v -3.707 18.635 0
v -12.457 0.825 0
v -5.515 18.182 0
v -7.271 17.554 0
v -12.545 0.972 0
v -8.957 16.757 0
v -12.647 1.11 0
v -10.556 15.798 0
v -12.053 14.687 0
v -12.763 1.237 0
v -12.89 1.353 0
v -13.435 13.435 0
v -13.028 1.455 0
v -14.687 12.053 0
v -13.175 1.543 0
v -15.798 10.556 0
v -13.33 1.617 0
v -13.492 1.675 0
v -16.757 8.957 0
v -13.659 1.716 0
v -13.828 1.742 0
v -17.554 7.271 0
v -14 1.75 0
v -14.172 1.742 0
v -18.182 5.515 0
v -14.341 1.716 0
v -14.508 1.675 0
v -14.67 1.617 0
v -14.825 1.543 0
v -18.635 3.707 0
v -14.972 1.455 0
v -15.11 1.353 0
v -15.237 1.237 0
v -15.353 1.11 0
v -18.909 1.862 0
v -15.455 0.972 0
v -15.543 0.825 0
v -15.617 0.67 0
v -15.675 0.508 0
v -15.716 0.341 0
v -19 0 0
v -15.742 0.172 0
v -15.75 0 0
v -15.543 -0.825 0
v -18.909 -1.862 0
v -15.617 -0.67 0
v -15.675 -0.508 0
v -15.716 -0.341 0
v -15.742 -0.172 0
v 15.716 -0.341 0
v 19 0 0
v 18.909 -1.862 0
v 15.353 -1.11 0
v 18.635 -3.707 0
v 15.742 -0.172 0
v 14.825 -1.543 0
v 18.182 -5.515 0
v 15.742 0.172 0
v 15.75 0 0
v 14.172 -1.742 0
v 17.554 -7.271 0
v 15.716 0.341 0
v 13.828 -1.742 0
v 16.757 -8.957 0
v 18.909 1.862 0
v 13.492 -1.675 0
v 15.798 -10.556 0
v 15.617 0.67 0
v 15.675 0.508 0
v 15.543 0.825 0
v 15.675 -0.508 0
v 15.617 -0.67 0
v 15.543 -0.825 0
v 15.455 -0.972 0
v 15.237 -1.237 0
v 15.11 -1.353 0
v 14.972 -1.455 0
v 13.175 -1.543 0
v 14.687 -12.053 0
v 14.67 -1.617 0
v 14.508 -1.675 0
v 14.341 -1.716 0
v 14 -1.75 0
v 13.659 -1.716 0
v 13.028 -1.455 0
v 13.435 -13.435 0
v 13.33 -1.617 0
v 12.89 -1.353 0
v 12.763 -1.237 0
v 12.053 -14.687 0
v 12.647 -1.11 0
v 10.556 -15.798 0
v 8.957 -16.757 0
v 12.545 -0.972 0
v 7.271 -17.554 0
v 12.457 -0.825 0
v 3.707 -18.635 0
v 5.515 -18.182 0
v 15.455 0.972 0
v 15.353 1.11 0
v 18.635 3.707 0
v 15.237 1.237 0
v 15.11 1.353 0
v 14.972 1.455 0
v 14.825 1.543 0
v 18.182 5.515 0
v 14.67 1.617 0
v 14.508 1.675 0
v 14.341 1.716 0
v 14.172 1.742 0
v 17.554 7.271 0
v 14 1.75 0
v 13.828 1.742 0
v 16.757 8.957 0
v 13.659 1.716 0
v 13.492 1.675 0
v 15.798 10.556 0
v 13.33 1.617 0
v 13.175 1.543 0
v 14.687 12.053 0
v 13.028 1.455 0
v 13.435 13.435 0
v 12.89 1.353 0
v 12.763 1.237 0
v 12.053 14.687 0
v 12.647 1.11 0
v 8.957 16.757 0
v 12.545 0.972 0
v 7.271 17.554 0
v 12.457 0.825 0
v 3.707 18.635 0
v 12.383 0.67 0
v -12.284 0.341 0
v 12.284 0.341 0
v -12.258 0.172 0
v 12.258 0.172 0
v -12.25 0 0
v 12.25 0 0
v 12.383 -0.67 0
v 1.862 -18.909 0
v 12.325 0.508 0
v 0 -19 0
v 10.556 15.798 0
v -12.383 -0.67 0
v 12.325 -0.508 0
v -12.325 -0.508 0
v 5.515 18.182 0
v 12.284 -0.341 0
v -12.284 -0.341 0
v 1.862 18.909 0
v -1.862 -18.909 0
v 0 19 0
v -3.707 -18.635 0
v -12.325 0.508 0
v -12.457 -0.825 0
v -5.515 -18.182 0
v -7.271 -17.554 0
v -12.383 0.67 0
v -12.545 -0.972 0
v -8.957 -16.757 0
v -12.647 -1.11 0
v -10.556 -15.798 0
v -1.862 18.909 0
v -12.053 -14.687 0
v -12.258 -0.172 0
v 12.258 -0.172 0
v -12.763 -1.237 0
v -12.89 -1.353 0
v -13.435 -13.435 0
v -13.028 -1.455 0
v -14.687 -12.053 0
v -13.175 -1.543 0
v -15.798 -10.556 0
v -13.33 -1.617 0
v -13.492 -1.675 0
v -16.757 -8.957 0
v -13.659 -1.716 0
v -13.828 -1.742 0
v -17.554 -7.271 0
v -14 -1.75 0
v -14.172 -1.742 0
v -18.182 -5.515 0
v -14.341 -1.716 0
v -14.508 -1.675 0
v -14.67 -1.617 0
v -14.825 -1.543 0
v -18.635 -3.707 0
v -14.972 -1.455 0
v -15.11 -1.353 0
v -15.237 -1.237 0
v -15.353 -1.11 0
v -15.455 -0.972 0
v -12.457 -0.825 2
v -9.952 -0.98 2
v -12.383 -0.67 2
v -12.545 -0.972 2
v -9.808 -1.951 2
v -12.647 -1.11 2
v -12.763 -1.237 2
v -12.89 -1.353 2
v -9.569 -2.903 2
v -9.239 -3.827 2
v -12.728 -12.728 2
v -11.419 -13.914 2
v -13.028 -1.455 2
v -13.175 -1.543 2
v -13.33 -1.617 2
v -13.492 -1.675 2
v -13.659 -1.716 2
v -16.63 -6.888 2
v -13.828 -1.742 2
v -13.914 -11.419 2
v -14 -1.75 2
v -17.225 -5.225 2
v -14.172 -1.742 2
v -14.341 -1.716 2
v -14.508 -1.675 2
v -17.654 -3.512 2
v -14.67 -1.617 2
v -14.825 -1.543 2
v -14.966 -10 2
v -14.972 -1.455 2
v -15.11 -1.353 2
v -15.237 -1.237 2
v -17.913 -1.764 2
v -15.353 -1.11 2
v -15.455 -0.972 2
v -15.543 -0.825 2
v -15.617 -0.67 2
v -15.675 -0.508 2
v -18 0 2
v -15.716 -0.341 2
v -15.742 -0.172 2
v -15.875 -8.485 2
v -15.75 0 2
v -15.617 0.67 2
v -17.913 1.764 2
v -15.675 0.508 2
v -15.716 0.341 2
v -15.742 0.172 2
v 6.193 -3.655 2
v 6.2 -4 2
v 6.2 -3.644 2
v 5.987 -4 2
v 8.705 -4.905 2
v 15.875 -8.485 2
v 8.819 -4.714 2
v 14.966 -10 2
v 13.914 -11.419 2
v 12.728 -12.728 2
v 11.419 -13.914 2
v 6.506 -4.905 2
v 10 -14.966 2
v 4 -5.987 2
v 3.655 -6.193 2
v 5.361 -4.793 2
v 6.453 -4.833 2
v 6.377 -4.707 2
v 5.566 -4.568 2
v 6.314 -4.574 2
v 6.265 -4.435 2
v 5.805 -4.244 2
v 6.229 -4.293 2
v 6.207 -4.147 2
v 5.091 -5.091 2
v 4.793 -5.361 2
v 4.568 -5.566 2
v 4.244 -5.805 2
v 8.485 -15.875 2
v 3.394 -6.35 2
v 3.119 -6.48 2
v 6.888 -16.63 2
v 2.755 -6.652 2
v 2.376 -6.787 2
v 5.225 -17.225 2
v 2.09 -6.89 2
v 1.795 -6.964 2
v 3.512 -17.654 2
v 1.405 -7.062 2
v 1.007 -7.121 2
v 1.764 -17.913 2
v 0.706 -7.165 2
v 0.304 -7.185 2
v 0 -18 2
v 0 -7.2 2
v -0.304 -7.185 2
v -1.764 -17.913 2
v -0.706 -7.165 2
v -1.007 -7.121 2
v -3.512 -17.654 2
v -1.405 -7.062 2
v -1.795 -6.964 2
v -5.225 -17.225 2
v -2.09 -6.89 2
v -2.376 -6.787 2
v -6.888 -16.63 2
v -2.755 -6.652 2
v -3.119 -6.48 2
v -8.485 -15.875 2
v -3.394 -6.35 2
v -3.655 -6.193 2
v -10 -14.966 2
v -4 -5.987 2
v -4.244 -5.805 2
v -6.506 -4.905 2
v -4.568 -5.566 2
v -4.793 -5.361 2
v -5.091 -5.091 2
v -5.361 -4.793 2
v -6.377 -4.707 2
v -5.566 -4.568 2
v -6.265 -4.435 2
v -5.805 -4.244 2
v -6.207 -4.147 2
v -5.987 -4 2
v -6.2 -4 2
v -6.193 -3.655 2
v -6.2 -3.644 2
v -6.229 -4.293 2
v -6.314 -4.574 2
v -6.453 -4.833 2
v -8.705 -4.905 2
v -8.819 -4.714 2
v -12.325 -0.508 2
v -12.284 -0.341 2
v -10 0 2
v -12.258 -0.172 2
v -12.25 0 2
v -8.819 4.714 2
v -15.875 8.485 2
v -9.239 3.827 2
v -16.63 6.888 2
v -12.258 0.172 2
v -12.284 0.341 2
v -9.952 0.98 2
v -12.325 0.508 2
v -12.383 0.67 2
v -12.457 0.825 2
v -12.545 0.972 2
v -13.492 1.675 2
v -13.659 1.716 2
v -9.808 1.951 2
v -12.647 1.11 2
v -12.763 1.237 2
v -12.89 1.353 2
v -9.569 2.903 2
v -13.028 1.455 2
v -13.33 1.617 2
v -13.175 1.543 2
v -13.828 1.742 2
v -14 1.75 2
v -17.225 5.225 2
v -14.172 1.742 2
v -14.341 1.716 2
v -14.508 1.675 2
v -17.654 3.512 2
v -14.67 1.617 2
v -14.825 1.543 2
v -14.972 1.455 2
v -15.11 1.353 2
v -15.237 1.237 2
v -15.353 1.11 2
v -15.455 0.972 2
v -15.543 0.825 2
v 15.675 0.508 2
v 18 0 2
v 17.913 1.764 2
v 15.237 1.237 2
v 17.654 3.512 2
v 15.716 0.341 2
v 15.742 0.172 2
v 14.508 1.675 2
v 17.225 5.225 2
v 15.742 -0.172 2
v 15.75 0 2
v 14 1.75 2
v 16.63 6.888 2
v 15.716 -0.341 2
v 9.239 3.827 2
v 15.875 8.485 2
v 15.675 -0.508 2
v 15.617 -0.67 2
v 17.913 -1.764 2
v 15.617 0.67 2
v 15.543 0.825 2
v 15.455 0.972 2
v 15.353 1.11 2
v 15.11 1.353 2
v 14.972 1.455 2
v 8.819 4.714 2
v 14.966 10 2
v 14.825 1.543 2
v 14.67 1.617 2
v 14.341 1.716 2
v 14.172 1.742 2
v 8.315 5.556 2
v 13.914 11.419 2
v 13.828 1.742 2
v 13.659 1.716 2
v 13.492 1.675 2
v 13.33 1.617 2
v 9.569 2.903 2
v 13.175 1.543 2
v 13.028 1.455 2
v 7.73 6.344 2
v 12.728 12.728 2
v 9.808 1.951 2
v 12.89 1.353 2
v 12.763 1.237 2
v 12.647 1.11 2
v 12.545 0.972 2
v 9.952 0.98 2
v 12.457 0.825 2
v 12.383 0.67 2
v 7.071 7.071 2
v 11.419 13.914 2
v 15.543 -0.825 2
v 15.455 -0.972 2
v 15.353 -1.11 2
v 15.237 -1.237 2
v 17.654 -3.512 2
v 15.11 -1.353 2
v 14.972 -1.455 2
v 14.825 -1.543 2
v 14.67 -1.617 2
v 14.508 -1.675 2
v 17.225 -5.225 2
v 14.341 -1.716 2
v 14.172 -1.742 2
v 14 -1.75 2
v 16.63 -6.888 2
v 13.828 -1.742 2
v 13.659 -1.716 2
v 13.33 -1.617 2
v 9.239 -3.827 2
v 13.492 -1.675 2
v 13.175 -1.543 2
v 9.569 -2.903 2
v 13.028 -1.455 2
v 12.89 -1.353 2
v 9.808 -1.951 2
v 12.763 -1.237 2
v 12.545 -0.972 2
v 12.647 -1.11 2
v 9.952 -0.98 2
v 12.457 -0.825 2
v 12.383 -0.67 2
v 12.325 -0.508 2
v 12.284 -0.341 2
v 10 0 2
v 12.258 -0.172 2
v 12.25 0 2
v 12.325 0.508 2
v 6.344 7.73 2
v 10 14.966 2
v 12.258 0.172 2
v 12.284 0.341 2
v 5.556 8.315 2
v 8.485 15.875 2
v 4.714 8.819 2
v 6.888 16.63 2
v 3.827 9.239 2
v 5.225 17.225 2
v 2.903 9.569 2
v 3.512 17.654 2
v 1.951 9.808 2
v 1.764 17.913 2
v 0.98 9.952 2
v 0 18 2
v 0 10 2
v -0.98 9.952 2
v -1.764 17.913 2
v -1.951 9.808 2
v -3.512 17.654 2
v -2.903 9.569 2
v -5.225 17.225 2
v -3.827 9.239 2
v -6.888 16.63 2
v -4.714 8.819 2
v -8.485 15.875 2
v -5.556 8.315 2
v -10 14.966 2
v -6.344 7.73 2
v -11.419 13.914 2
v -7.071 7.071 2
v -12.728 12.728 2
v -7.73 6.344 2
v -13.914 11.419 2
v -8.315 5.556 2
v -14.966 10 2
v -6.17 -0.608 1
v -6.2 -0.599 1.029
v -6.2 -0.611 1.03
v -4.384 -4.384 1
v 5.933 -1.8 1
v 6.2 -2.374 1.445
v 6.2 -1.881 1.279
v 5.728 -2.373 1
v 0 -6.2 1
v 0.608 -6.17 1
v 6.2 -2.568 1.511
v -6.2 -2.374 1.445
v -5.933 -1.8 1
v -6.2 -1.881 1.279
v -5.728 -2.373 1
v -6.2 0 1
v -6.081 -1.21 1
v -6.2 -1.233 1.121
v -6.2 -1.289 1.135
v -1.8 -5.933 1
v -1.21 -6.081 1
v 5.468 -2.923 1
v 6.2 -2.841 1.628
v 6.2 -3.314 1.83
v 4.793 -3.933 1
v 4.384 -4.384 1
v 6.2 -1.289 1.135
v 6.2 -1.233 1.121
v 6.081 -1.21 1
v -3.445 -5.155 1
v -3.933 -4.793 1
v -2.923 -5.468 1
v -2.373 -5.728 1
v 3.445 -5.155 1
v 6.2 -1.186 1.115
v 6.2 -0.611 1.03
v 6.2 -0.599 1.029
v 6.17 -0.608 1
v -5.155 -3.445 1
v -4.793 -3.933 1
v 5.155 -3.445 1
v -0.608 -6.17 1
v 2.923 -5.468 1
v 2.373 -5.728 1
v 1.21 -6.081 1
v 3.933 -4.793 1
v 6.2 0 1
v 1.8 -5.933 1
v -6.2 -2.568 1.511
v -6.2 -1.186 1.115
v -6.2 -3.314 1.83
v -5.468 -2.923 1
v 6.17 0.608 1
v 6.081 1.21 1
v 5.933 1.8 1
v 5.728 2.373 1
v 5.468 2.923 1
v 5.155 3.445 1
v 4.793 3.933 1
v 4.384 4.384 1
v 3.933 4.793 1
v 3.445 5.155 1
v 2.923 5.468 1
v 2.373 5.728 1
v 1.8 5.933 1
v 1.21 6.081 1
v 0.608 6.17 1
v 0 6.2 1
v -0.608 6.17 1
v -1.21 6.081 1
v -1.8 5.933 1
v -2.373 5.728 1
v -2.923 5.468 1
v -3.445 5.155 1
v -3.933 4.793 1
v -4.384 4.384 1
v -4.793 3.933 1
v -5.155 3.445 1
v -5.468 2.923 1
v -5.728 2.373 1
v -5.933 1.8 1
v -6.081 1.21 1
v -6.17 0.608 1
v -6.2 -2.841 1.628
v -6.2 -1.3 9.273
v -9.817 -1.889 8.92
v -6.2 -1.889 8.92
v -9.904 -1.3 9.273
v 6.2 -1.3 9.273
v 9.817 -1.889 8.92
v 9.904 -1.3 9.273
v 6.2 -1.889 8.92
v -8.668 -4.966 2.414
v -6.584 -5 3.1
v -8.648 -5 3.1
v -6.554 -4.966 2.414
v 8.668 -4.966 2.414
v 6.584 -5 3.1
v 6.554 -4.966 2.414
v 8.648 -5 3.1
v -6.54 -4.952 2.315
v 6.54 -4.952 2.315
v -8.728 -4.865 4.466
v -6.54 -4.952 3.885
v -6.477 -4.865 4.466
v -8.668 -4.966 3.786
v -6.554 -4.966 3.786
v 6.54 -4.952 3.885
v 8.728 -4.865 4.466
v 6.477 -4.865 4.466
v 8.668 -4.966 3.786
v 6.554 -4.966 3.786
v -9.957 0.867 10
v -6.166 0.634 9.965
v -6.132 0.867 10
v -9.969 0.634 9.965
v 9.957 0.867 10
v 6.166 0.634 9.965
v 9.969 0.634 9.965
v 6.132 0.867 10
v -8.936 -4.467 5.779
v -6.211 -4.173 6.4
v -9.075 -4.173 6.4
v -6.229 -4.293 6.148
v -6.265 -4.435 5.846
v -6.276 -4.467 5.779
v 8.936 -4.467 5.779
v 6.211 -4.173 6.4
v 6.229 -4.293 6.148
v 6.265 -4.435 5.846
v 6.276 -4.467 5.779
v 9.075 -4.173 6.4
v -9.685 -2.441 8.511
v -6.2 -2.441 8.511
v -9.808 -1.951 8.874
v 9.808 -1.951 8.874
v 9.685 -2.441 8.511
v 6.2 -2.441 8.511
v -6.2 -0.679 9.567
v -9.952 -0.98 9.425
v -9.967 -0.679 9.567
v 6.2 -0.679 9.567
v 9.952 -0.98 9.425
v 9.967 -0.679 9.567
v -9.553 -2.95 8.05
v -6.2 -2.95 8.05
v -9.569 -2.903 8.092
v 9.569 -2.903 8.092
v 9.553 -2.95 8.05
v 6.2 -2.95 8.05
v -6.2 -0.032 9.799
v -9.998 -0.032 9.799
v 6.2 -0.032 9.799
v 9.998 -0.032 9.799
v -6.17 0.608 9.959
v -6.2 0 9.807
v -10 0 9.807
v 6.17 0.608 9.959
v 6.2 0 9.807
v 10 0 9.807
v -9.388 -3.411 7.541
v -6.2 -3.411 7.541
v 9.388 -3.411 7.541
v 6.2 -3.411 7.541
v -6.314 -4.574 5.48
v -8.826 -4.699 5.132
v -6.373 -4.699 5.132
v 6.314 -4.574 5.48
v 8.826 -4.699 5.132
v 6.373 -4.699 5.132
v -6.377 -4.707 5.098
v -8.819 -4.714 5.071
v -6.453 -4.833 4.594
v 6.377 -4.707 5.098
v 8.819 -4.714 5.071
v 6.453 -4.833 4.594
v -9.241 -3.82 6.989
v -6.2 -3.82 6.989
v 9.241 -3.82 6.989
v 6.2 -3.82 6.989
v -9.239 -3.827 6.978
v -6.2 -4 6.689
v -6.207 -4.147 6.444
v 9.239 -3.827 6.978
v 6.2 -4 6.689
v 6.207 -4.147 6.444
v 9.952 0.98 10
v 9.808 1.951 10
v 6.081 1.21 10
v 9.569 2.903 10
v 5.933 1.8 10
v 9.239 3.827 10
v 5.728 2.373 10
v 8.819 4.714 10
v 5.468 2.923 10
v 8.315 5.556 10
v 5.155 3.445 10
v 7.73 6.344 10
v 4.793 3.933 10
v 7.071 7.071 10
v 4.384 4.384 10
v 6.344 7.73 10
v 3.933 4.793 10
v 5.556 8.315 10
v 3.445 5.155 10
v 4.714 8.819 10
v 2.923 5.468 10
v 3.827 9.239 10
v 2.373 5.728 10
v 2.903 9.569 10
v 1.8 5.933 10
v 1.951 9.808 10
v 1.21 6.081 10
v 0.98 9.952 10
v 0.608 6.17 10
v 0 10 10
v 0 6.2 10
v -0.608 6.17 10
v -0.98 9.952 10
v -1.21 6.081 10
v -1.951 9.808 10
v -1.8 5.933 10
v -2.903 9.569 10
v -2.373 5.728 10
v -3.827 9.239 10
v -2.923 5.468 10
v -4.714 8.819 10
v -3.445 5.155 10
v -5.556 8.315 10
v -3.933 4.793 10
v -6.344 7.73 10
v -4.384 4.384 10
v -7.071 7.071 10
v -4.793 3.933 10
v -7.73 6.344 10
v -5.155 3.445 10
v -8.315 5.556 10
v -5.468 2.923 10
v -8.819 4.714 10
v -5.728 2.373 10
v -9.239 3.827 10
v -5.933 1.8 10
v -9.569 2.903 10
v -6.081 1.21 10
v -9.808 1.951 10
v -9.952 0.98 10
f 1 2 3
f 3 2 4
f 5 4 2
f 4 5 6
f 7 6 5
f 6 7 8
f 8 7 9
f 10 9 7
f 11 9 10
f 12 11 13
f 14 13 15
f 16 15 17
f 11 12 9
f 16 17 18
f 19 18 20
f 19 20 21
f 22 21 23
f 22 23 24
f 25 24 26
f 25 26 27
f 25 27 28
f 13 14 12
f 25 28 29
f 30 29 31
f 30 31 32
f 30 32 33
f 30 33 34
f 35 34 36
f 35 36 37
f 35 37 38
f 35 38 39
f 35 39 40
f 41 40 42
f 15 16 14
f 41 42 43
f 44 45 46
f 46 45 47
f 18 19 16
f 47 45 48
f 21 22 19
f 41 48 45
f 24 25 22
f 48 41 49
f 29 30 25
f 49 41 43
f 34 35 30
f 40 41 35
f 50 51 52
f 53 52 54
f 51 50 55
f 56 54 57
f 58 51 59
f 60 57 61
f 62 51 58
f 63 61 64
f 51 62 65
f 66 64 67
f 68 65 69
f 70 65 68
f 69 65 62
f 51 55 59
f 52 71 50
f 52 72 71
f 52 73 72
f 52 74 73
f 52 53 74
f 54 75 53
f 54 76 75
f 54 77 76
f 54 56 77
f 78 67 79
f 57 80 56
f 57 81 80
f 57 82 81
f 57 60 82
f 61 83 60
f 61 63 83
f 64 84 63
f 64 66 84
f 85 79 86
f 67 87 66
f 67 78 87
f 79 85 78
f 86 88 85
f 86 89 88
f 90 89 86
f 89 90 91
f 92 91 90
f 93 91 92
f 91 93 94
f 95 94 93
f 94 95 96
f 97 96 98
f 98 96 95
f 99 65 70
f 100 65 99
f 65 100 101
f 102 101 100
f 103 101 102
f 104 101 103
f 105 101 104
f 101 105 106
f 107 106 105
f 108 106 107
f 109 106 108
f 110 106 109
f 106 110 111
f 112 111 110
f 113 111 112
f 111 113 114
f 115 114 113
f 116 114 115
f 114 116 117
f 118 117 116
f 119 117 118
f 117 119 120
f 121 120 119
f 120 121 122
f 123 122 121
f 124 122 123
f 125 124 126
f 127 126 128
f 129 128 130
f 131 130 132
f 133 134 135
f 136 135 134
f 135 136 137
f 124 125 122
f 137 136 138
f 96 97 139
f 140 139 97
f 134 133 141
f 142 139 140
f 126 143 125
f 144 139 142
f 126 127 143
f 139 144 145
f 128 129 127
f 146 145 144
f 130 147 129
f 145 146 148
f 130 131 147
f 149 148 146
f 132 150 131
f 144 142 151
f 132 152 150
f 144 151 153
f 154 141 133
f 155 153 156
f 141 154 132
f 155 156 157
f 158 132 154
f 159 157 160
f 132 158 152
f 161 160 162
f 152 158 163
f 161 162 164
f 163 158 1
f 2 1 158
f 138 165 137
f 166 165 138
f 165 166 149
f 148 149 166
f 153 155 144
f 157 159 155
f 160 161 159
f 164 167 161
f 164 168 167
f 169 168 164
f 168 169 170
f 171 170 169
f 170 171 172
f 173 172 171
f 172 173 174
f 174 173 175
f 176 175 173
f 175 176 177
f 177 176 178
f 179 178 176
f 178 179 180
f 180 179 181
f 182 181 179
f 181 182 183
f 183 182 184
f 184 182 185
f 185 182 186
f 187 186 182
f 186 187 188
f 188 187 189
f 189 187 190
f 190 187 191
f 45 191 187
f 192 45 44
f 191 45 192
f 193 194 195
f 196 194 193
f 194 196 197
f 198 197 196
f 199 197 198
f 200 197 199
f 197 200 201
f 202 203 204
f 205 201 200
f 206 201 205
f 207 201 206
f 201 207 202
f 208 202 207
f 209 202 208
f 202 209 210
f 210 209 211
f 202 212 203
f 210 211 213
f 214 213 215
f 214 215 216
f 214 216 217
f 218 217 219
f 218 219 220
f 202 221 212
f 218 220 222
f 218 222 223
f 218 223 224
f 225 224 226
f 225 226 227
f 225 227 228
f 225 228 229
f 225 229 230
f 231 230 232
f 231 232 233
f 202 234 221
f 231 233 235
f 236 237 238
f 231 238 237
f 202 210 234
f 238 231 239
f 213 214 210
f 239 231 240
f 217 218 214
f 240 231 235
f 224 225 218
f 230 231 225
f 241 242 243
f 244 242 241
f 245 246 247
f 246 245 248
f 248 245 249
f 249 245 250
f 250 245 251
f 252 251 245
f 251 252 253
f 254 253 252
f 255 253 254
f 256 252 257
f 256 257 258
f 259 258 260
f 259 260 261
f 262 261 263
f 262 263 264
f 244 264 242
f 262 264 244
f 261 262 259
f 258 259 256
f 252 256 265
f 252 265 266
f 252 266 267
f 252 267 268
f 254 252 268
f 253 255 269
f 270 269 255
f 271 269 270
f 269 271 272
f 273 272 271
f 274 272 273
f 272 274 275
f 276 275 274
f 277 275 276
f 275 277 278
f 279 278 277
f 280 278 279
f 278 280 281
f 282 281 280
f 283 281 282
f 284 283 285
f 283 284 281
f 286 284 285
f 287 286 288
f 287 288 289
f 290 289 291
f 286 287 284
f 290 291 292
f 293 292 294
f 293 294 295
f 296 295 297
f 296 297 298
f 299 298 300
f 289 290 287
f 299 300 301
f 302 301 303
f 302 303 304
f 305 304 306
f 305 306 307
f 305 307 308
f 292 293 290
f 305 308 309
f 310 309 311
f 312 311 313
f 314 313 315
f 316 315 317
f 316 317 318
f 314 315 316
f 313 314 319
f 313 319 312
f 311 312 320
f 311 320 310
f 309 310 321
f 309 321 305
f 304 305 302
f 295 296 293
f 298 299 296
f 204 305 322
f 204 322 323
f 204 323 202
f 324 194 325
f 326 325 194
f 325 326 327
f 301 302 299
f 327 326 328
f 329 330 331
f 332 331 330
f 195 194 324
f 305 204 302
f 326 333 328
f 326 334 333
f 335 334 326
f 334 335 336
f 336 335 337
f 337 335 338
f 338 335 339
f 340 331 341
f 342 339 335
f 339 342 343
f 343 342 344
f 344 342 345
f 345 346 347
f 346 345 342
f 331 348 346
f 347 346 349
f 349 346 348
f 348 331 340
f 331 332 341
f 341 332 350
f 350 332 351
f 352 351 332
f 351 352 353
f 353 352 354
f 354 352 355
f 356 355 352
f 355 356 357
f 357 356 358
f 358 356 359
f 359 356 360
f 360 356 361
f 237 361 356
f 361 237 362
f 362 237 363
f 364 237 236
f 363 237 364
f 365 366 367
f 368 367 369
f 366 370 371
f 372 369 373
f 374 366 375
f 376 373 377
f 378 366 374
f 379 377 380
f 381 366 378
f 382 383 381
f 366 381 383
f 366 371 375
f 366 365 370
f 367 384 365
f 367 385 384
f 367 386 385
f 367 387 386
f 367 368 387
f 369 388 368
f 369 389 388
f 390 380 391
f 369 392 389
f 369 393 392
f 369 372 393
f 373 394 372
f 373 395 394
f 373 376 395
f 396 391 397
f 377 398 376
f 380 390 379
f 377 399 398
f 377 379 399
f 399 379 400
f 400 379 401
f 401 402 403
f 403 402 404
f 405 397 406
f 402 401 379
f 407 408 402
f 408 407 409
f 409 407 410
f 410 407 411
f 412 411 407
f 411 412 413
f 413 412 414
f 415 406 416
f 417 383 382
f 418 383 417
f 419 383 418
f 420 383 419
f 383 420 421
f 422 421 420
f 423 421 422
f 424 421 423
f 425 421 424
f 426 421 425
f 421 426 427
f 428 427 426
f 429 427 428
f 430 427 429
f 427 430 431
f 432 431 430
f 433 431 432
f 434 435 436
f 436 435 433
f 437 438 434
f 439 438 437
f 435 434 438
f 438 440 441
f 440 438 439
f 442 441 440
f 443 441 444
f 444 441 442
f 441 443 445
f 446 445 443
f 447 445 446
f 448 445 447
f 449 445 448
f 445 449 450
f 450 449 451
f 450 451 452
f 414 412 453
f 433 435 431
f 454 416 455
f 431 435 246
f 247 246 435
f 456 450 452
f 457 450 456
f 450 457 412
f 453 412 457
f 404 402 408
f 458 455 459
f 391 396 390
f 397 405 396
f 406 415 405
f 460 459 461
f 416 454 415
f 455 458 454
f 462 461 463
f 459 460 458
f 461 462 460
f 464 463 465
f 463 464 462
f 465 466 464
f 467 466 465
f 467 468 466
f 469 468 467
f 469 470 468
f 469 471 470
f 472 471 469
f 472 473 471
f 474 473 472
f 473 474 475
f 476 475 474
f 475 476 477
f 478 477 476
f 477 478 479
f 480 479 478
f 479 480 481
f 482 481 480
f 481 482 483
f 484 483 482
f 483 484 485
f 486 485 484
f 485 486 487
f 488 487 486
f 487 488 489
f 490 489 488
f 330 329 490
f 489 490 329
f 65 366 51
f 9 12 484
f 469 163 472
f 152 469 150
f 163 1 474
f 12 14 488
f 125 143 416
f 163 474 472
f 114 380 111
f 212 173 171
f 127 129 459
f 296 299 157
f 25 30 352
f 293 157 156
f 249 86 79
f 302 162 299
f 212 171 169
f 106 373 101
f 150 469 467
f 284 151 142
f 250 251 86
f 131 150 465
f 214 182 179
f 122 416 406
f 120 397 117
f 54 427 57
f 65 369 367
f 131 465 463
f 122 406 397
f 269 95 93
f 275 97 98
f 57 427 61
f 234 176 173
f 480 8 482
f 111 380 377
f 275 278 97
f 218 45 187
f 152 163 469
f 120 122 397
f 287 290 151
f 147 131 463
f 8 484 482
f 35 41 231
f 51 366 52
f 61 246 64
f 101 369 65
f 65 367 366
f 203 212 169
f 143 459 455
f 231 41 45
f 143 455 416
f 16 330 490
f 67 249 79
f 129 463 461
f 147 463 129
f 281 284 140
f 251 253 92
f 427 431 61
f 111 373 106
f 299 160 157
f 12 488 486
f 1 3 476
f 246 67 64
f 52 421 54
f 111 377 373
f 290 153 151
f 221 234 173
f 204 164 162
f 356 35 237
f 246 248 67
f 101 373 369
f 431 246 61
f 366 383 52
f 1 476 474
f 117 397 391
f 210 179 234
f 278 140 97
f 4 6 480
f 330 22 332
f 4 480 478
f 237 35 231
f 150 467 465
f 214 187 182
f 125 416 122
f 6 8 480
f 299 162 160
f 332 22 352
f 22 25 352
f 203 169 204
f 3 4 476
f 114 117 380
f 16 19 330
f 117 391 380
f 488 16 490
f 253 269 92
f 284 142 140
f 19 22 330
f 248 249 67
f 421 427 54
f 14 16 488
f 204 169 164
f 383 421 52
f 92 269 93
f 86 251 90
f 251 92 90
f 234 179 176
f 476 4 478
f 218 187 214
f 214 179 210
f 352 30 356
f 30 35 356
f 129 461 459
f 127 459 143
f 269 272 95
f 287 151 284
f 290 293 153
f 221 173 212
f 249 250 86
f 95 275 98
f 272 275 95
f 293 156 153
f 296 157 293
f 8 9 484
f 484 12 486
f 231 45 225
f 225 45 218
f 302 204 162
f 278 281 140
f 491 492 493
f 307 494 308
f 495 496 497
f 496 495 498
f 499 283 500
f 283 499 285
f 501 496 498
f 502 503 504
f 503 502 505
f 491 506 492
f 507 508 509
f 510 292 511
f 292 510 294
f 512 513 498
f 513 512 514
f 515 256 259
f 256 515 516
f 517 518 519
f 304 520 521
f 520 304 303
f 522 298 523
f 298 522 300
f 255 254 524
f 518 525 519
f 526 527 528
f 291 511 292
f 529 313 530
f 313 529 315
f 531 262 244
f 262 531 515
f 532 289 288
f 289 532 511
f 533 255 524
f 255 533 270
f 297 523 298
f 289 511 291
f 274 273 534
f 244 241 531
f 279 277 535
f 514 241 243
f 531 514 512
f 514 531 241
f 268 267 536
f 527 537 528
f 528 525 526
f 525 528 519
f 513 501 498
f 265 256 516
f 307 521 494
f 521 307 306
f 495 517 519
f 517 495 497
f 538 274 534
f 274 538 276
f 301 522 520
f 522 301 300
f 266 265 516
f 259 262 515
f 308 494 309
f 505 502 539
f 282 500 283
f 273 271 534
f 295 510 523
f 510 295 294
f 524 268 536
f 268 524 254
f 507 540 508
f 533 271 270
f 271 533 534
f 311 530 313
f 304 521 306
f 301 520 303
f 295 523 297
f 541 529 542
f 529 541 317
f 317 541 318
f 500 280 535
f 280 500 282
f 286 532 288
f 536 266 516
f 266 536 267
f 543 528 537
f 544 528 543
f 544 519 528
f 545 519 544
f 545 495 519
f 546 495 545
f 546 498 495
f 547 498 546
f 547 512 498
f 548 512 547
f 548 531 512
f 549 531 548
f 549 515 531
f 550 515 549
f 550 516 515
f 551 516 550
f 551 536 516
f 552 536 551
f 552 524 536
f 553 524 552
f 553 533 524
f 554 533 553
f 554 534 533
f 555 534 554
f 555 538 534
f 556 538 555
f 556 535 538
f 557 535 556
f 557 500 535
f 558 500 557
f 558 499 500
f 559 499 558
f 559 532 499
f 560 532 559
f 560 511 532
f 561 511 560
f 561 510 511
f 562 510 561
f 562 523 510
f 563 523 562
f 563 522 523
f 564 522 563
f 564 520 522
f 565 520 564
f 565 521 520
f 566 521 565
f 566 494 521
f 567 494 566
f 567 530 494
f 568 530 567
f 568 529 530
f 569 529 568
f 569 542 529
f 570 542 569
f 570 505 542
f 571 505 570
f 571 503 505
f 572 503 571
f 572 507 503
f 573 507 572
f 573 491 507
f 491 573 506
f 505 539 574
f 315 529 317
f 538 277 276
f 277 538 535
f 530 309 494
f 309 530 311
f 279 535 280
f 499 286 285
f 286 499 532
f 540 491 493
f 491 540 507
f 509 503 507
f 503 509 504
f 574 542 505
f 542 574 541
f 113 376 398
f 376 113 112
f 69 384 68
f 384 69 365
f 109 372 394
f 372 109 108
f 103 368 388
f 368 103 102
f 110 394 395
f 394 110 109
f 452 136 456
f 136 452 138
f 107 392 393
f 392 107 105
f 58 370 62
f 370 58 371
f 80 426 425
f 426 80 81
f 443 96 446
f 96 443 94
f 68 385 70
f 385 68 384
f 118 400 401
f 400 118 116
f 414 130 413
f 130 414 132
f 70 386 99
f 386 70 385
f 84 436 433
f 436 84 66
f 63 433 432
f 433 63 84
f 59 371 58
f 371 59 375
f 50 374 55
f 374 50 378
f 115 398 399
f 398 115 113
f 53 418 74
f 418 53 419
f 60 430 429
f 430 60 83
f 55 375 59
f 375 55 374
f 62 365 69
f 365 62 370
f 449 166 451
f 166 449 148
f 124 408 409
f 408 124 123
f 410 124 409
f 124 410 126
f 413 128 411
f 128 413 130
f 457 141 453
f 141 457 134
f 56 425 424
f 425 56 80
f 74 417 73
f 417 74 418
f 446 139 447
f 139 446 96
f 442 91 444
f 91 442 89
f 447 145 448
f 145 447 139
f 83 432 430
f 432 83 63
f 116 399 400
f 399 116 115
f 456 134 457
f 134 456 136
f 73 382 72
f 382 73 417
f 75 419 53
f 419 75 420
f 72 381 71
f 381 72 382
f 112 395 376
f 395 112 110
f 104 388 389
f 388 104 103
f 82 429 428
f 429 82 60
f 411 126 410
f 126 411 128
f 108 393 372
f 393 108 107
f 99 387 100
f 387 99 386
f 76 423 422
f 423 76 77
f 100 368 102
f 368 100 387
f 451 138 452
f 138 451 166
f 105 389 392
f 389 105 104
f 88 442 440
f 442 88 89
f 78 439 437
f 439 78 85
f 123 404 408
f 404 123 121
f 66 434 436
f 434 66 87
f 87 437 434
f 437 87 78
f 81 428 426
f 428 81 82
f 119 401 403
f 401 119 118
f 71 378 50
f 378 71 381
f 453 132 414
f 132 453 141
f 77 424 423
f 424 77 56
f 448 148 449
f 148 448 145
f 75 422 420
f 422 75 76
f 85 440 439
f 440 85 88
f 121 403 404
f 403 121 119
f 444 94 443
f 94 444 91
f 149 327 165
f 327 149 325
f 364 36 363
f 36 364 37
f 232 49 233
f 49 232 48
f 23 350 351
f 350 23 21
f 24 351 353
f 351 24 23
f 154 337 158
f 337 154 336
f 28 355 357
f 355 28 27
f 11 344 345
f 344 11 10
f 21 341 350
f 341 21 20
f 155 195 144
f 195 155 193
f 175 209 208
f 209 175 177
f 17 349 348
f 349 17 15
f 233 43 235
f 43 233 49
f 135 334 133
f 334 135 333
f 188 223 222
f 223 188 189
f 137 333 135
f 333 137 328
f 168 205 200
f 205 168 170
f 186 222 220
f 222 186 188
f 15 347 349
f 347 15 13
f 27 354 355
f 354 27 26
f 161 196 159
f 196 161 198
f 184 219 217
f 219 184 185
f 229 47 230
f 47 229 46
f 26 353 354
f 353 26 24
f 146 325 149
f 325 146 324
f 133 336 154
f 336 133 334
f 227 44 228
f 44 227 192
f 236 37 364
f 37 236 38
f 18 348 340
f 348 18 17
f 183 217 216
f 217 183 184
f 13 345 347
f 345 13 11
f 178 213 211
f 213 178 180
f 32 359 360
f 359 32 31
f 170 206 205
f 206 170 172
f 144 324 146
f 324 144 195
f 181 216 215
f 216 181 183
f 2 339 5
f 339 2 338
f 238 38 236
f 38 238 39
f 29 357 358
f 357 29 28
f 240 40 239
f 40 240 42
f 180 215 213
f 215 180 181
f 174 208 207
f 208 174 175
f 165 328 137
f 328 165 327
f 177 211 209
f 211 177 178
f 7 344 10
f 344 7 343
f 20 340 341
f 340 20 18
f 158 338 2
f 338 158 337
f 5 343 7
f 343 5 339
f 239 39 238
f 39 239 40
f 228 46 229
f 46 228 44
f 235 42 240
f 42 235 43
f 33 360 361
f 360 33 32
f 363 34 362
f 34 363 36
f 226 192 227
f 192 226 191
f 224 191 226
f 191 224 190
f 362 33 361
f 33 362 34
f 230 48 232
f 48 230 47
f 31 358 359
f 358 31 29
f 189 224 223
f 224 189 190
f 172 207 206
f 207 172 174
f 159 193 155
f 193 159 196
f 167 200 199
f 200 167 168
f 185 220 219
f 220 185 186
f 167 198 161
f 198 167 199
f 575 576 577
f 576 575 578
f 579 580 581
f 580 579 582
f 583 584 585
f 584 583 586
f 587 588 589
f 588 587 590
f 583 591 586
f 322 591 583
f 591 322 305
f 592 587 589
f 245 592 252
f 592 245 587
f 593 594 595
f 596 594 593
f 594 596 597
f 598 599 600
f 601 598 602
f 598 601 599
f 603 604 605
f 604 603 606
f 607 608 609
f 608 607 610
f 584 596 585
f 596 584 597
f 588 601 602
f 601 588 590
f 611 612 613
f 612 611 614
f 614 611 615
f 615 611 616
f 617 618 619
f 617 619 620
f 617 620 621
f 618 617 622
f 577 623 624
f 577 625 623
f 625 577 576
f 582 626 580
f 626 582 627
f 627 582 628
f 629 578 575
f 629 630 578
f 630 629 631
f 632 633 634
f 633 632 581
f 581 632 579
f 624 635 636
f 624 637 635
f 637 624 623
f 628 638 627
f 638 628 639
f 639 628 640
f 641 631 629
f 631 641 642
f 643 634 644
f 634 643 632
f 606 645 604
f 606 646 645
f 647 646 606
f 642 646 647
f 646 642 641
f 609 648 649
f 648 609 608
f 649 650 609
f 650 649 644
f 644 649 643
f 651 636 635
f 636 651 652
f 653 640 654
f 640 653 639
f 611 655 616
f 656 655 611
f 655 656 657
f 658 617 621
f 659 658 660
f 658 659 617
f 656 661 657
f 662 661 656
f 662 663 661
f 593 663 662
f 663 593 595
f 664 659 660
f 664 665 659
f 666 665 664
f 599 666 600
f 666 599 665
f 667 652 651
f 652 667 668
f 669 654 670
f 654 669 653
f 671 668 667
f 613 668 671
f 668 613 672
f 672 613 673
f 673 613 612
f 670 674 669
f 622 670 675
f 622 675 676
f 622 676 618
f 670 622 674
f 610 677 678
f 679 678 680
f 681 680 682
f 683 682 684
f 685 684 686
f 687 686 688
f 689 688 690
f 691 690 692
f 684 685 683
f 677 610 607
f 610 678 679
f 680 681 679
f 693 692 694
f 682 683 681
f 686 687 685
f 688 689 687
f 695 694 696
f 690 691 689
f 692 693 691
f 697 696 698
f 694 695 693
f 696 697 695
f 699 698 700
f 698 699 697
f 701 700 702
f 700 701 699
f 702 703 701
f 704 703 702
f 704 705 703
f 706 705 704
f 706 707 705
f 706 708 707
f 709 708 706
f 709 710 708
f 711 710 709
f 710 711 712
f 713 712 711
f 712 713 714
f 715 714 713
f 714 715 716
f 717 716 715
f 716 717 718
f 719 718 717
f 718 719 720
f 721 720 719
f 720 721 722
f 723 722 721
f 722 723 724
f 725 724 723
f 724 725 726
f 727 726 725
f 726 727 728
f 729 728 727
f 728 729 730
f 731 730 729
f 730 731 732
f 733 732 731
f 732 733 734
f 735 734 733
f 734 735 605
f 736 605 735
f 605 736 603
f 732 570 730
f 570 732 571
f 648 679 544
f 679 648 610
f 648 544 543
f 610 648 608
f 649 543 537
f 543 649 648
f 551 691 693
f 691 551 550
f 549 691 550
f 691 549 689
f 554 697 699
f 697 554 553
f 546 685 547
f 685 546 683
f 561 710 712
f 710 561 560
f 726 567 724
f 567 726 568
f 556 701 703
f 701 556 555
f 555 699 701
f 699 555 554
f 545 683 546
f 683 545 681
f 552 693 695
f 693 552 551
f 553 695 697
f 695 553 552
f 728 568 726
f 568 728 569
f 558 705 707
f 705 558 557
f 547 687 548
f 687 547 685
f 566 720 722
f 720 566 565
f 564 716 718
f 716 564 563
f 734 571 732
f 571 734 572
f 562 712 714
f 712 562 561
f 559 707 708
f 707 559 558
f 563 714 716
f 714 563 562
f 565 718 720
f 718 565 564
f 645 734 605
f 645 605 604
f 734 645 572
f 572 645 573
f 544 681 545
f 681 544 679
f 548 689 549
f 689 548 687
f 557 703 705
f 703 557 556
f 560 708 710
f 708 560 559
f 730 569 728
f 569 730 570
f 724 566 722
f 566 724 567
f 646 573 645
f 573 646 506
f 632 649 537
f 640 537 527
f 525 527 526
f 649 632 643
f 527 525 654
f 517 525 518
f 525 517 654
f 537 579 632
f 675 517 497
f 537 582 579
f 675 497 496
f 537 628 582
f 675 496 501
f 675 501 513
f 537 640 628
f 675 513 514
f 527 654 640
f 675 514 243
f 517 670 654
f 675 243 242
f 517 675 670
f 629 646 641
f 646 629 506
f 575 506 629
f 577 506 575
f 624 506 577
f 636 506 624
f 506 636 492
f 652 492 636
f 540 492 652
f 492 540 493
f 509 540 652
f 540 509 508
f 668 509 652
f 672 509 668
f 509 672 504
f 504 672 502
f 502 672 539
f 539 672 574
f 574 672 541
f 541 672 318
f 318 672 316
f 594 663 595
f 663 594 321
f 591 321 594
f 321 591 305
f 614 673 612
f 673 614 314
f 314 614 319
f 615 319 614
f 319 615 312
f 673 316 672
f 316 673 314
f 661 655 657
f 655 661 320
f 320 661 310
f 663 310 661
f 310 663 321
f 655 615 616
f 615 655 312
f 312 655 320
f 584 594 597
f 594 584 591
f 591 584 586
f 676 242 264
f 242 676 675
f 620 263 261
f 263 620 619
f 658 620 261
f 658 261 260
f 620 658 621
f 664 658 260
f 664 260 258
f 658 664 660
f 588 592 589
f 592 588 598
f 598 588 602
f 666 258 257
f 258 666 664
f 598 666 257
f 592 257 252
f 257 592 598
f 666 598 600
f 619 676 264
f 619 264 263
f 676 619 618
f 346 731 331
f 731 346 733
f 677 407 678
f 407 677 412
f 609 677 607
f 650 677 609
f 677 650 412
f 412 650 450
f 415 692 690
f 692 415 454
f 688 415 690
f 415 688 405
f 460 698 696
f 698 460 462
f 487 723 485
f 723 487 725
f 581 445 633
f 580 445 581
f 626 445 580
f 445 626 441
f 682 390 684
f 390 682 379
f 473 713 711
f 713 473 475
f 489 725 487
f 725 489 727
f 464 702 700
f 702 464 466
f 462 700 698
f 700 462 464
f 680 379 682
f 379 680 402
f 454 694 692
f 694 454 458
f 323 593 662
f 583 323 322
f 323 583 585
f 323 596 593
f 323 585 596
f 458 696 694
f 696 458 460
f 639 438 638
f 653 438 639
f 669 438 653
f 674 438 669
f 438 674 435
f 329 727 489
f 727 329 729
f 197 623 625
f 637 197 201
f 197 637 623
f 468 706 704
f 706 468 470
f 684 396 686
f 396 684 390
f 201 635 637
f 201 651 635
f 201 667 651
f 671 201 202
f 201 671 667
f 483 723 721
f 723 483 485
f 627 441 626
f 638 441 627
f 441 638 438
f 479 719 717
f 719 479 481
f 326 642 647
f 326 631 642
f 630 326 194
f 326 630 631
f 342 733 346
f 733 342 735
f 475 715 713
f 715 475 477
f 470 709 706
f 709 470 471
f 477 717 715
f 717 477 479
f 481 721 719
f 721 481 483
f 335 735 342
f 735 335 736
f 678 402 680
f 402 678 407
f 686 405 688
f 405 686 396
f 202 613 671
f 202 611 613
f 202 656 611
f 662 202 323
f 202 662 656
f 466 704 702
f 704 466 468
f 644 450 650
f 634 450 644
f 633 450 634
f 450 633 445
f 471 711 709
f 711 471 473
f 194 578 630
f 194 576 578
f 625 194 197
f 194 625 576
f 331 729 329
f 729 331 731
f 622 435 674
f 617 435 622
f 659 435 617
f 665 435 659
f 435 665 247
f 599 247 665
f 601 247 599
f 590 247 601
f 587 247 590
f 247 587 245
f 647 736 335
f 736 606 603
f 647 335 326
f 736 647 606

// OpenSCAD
$fn=64;


base_r = 18;

// base
difference() {
    union() {
        cylinder(h=2, r=base_r);
        cylinder(h=2, r=base_r+1, r2=base_r);
    }
    // inner hole for rod
    translate([0, 0, 1]) {
        cylinder(h=2, r=6.2, r2=8.2);
    }
    translate([14, 0, 0])
        cylinder(r=1.75, h=3);
    translate([-14, 0, 0])
        cylinder(r=1.75, h=3);
}

// hook
intersection() {
    cylinder(h=10, r=10);
    translate([-15, 1, 0]) {
        translate([0, 1, 3.1]) {
            rotate(90, [0, 1, 0]) {
                cylinder(h=30, r=7);
            }
        }
        cube([30, 15, 10]);
    }
    union() {
        difference() {
            translate([0, 6, 5]) {
                cube([20,20,10], center=true);
            }
            cylinder(h=10, r=6.2);
            translate([0, -5, 5]) {
                cube([12.4,10,10], center=true);
            }
        }
        translate([-7.7,-4,0]) {
            cylinder(h=10, r=1.5);
            translate([15.4,0,0]) {
                cylinder(h=10, r=1.5);
            }
        }
    }
}
